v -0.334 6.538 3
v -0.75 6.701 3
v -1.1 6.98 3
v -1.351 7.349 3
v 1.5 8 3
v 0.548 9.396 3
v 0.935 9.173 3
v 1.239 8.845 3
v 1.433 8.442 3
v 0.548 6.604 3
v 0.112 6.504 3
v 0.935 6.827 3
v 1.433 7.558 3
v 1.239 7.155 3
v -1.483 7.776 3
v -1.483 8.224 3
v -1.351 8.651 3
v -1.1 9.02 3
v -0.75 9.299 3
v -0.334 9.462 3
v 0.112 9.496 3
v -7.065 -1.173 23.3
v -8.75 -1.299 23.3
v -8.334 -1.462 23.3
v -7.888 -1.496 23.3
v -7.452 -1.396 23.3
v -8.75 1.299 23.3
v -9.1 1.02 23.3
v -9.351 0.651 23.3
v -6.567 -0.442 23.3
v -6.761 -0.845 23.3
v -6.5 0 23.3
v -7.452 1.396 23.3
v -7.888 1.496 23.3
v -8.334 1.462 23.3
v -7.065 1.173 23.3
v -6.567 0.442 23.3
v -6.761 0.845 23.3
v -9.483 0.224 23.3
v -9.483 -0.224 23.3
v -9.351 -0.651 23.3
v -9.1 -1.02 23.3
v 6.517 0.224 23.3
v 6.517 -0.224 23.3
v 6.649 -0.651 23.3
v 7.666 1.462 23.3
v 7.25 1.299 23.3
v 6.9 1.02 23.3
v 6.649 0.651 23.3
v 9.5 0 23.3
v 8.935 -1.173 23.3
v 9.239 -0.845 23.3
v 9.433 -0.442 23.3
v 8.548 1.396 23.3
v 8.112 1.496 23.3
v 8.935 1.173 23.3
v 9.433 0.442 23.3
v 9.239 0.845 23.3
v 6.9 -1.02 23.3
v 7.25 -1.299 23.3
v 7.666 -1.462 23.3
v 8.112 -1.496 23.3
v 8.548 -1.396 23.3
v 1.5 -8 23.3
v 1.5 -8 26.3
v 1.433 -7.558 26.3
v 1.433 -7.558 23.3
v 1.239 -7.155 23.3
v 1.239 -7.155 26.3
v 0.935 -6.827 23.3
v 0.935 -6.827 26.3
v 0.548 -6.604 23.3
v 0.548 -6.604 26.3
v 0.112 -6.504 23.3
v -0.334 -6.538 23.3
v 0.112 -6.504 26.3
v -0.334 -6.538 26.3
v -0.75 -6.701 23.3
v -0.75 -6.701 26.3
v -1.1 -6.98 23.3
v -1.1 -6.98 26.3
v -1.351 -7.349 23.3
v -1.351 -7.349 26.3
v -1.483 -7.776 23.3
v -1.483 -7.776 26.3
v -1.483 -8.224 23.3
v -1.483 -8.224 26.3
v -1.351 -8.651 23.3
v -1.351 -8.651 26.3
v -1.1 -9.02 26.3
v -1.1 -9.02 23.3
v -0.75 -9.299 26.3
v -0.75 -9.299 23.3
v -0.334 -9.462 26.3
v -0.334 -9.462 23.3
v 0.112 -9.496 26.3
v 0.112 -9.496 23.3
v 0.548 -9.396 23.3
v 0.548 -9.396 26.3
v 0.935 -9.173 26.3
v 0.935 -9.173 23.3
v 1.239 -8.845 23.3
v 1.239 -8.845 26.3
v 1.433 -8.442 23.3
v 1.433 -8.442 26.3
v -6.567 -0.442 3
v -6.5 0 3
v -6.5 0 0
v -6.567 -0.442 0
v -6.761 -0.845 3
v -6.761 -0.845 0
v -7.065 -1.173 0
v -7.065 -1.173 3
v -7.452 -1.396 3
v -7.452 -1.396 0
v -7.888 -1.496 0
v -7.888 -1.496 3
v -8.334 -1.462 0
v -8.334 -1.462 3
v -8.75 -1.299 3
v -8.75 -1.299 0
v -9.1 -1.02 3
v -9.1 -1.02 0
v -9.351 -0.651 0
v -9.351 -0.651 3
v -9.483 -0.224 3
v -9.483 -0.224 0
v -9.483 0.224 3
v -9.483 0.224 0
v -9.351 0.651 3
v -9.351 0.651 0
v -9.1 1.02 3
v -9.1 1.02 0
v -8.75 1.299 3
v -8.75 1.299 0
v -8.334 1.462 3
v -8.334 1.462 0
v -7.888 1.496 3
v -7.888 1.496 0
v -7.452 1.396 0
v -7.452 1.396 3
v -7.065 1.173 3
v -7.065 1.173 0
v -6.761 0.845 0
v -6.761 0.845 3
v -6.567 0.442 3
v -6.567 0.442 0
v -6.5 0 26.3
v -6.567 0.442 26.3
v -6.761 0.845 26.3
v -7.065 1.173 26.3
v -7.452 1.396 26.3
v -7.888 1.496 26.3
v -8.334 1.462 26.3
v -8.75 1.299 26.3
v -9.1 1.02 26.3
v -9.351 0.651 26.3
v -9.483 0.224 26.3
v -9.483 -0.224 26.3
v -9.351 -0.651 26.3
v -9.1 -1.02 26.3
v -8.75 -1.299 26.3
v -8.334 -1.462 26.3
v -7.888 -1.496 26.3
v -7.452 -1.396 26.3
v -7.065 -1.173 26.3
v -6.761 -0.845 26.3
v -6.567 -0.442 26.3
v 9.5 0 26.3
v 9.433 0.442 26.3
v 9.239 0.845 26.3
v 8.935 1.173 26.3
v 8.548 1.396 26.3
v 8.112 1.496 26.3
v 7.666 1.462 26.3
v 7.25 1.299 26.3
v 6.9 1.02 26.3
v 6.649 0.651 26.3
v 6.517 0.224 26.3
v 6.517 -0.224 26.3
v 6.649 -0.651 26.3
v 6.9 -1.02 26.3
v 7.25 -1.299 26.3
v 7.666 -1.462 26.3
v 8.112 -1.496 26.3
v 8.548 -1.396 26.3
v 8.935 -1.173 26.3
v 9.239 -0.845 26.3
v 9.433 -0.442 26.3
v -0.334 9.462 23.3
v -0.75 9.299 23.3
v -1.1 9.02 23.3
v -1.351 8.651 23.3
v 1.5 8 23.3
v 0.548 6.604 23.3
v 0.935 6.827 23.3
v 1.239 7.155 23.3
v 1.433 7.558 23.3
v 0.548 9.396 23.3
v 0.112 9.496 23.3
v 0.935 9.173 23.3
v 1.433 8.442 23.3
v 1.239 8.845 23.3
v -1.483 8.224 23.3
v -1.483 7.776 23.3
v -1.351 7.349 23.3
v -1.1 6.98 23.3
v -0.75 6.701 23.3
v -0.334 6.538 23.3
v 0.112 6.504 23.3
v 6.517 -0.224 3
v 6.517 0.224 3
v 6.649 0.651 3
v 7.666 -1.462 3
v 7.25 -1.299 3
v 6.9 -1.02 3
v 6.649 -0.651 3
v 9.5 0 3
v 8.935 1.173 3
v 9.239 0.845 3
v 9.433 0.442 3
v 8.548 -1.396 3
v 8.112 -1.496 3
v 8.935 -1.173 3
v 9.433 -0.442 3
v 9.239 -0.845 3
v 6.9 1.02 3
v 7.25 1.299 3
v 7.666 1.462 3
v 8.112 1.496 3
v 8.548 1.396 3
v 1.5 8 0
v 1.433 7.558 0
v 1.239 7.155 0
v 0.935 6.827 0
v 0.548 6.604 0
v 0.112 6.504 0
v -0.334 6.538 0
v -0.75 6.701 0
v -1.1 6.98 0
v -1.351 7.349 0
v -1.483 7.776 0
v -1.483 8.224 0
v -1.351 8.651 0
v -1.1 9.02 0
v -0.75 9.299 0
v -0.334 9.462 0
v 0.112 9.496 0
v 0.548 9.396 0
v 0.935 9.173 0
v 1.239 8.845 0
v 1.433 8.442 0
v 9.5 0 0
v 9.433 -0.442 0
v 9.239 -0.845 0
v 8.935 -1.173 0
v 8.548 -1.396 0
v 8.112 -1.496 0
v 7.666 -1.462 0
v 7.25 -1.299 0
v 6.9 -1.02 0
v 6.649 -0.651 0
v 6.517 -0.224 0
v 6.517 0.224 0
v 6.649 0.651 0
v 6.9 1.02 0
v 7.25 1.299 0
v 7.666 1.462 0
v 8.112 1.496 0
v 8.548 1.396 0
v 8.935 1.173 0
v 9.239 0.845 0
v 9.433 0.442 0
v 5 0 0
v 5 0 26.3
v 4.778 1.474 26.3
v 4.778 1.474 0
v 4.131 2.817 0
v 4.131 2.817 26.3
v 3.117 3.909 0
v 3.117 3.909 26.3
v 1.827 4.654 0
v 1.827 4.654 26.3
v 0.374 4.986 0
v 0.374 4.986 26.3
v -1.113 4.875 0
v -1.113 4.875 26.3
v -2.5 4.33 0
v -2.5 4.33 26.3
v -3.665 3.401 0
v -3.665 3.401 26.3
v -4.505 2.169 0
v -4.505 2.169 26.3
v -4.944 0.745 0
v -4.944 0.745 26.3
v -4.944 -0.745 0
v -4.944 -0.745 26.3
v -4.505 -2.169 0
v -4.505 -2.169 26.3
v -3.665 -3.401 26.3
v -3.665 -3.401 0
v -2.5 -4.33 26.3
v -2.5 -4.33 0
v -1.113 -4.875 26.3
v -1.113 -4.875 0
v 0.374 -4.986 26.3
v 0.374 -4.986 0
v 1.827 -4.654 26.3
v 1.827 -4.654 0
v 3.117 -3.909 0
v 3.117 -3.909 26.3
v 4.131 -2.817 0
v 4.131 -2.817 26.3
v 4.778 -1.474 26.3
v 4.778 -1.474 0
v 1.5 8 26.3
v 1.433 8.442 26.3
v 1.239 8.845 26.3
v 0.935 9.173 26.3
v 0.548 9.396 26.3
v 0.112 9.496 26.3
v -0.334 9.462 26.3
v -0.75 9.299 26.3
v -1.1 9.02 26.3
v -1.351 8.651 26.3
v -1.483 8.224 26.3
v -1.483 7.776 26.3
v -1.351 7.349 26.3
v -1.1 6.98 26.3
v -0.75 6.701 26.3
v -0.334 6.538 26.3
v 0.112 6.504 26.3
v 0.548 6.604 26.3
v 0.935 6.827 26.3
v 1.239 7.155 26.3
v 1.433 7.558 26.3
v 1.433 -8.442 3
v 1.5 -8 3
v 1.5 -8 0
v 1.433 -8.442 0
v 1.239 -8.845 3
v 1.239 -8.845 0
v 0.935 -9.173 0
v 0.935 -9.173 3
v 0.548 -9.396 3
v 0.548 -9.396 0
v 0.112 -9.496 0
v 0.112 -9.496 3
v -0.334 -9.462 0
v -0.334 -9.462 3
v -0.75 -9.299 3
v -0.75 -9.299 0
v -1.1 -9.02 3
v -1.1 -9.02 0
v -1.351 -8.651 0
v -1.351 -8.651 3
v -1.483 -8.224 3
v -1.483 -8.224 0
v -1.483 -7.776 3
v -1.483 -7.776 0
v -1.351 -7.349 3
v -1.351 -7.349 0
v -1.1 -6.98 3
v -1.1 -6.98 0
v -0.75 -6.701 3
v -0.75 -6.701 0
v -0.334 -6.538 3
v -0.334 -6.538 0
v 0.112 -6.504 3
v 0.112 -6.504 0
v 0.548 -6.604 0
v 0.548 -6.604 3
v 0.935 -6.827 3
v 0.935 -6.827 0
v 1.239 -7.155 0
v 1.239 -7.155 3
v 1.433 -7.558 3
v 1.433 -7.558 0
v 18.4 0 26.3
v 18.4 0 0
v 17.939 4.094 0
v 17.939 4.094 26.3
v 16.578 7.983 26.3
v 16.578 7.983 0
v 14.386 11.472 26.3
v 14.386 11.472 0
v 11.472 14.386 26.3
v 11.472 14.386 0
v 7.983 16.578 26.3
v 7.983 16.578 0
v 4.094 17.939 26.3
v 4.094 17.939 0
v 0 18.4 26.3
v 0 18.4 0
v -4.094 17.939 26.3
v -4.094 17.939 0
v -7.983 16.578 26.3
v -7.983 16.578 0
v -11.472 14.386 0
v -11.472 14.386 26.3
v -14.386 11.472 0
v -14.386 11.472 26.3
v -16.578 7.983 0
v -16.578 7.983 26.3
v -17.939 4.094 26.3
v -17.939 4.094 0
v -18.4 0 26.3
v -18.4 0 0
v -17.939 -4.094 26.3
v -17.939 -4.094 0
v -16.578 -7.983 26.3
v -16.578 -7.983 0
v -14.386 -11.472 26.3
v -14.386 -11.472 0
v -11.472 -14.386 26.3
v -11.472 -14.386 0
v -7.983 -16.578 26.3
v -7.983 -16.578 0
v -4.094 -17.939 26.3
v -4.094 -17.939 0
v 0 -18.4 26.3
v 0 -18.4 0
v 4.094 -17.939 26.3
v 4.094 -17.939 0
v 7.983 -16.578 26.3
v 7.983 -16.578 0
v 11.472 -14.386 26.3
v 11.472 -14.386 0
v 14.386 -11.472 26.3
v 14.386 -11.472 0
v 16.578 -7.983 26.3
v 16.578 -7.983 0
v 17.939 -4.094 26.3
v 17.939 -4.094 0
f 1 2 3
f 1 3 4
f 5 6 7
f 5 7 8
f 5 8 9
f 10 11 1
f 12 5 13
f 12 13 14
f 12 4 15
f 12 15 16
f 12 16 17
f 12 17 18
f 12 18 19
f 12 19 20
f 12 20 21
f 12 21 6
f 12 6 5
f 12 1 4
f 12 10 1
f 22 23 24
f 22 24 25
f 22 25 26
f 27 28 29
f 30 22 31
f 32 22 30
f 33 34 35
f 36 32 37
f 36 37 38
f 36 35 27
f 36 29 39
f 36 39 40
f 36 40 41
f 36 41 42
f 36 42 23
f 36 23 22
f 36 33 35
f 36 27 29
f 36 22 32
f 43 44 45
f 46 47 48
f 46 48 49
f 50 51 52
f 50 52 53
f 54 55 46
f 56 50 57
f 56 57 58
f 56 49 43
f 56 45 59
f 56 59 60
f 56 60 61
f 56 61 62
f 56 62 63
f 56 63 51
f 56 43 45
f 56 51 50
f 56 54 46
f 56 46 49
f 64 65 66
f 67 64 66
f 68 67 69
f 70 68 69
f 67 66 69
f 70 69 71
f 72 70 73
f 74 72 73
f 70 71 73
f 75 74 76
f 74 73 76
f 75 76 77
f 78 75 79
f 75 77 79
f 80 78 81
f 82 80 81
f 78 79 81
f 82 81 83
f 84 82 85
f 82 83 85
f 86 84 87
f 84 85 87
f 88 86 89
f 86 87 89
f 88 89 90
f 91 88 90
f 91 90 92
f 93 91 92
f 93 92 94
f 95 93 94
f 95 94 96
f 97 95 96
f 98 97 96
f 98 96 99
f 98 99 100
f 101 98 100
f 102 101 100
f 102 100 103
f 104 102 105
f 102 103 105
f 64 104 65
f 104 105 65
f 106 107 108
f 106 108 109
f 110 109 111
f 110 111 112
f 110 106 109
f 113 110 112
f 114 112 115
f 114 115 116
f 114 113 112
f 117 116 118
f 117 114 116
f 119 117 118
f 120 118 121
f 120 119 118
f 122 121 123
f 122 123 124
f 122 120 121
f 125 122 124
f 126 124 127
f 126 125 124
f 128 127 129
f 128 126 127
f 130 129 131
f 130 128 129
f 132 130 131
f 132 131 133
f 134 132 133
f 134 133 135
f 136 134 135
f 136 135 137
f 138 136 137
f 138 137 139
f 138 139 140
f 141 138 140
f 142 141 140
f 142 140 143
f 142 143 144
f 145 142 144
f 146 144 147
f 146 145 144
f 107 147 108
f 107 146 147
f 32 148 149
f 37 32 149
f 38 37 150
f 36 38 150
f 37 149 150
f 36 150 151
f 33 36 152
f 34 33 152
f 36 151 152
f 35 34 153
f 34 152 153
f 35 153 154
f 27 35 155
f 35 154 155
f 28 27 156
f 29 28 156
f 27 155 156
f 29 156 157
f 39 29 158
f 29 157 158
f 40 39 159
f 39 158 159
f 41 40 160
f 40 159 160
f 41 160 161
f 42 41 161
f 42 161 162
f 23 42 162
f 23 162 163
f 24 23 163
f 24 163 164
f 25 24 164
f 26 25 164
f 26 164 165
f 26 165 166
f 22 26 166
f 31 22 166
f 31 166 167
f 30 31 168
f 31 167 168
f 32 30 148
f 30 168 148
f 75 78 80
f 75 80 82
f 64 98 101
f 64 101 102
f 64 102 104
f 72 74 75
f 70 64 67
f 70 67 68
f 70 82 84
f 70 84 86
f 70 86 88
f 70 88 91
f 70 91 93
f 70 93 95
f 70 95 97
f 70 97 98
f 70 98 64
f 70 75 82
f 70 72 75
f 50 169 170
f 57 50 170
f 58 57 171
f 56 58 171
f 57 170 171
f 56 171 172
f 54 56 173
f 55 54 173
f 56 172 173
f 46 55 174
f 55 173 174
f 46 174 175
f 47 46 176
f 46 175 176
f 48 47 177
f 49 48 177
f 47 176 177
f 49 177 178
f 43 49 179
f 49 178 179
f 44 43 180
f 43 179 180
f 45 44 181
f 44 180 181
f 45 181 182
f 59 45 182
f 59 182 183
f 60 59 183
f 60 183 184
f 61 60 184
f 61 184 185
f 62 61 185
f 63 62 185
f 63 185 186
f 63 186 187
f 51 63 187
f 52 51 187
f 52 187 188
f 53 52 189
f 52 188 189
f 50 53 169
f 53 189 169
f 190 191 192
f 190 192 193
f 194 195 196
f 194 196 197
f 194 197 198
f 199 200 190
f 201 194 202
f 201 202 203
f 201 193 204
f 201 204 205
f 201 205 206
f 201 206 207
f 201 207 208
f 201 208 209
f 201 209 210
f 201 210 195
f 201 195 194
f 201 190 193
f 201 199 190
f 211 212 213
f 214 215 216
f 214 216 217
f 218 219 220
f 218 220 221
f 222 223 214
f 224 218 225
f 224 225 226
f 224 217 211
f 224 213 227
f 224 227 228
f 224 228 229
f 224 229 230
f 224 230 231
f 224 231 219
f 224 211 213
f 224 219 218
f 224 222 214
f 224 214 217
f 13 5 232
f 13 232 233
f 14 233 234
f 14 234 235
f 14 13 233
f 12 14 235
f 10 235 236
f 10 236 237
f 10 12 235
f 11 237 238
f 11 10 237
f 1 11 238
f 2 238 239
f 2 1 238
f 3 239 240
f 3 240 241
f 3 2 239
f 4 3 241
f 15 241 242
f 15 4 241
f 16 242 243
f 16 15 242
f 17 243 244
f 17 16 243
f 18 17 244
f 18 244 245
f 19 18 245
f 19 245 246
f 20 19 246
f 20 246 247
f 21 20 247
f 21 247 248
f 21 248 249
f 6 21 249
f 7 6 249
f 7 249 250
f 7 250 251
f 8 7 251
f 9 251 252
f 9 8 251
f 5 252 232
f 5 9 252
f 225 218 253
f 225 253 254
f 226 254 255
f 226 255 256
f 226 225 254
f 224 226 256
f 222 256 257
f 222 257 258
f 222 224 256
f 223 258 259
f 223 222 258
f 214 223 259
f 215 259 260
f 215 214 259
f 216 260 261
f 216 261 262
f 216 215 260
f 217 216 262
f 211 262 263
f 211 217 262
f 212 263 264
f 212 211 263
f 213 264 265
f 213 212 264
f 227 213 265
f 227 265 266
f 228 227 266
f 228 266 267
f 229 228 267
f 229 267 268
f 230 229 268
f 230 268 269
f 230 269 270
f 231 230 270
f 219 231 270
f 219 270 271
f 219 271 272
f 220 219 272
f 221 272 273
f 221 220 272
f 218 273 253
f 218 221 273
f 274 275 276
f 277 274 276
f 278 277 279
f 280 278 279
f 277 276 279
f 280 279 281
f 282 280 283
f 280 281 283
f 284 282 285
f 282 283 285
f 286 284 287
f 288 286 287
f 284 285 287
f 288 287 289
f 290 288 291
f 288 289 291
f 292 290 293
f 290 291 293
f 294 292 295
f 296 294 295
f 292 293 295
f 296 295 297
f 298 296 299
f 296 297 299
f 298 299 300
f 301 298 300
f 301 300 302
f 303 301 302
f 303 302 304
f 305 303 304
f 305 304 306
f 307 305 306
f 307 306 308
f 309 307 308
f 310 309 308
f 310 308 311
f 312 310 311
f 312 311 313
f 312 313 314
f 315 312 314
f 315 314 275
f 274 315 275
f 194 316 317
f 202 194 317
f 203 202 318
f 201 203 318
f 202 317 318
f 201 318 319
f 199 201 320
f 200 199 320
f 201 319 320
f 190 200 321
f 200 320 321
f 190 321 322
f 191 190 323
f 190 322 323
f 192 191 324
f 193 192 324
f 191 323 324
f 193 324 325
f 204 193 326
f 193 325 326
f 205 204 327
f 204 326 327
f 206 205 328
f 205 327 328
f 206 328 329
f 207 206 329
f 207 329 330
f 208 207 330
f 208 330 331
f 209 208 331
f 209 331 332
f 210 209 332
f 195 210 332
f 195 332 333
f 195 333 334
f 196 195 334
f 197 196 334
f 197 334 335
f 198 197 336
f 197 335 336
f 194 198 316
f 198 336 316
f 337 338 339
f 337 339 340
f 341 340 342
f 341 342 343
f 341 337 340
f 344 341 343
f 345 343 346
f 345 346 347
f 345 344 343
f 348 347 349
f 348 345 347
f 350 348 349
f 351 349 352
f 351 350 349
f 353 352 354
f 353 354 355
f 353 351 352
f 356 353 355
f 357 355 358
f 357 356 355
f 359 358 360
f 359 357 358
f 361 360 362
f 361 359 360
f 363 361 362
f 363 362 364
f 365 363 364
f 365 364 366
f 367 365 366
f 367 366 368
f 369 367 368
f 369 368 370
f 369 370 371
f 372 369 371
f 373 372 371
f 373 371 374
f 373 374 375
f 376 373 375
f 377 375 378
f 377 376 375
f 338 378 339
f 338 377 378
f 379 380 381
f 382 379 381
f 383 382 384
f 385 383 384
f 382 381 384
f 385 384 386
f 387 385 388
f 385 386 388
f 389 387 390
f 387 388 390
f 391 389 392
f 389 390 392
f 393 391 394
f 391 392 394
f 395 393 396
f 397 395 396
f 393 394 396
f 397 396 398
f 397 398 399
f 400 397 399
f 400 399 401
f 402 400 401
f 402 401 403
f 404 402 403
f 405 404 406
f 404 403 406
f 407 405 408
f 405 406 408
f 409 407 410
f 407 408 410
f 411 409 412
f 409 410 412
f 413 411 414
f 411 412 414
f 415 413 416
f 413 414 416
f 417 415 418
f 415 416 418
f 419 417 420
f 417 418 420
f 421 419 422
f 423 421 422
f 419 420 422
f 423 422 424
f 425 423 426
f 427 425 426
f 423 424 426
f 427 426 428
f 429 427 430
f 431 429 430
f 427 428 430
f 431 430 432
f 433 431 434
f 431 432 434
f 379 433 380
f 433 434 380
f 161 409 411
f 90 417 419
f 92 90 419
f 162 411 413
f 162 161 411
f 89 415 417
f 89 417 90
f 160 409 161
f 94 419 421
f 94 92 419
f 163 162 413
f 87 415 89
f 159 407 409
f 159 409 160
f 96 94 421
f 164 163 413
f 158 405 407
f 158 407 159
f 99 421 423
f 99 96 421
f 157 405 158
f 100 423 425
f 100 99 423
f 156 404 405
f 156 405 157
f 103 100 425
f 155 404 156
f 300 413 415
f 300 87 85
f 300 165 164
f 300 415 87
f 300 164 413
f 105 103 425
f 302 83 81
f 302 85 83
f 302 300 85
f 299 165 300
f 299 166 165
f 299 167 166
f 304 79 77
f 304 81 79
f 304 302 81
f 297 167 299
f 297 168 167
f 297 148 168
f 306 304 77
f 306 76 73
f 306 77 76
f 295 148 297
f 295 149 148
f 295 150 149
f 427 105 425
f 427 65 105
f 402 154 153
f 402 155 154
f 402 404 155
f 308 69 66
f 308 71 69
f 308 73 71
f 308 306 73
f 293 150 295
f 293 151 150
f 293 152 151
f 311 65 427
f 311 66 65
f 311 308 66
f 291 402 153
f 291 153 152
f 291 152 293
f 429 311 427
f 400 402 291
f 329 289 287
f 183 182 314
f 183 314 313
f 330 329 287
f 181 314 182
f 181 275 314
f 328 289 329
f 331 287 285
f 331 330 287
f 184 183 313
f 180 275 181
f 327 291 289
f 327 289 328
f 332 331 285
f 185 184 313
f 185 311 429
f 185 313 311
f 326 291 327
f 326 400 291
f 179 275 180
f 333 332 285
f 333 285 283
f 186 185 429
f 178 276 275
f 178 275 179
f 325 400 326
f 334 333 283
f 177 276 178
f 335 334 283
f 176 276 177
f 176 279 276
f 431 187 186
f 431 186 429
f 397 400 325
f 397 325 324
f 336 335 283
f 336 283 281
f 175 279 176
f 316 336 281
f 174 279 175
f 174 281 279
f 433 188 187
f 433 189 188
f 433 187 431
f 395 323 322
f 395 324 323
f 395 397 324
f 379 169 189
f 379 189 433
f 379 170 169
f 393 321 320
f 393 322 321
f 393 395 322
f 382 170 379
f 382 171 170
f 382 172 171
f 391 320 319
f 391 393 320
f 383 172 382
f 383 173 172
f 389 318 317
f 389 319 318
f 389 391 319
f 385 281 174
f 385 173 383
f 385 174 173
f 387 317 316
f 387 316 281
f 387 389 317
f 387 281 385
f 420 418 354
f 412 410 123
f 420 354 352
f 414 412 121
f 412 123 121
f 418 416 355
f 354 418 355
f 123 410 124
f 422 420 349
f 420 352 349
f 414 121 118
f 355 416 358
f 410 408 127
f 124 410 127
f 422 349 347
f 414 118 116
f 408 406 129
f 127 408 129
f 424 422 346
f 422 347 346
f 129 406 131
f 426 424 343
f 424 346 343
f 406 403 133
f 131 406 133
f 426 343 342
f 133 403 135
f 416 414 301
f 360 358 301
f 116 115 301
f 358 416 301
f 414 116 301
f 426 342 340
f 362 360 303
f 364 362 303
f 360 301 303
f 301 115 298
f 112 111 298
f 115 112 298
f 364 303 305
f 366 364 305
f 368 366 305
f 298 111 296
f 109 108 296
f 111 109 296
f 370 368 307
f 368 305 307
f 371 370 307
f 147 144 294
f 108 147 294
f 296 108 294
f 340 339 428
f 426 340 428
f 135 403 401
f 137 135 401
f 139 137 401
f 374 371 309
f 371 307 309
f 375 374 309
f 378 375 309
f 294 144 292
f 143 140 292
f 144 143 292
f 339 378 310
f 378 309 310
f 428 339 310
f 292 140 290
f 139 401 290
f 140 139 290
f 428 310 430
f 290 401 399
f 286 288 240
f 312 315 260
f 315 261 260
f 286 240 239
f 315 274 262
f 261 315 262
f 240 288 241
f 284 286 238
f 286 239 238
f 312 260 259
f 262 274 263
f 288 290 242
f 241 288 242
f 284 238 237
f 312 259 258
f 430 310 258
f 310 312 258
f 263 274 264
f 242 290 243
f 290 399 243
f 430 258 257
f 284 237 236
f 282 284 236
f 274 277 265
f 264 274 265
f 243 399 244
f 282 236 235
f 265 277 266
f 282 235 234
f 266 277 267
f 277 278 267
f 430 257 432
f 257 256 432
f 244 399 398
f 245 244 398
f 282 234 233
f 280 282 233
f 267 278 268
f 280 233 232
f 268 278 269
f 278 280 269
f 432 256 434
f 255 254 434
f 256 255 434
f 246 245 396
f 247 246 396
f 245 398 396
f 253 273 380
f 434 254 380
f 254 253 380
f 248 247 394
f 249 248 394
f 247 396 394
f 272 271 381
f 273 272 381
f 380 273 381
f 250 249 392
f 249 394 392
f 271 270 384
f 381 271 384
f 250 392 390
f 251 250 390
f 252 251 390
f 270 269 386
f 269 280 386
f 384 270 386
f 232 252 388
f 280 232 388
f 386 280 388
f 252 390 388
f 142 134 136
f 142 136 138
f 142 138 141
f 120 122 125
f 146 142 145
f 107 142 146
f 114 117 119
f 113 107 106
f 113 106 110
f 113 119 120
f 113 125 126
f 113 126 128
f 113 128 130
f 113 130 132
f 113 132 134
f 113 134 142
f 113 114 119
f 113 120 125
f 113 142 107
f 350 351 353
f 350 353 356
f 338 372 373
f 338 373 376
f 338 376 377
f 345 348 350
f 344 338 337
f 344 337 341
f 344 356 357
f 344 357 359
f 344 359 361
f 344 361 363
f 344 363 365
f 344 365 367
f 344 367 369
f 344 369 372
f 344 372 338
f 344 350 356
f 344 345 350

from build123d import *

# Parameters (mm, degrees)
CROQUIS1_R              = 18.4
SALIENTE_EXTRUIR1_DEPTH = 26.3
CROQUIS2_R              = 1.5
CORTAR_EXTRUIR1_DEPTH   = 3
CROQUIS3_R              = 5
CORTAR_EXTRUIR2_DEPTH   = 44
CORTAR_EXTRUIR3_START   = -3
CROQUIS4_R              = 1.5
CORTAR_EXTRUIR3_DEPTH   = 3


with BuildPart() as part:
    # Croquis1 → Saliente-Extruir1 (new body)
    with BuildSketch(Plane.XY):
        Circle(CROQUIS1_R)
    extrude(amount=SALIENTE_EXTRUIR1_DEPTH)

    # Croquis2 → Cortar-Extruir1 (cut)
    with BuildSketch(Plane.XY.offset(26.3)):
        with Locations((0, 8)):
            Circle(CROQUIS2_R)
        with Locations((8, 0)):
            Circle(CROQUIS2_R)
        with Locations((0, -8)):
            Circle(CROQUIS2_R)
        with Locations((-8, 0)):
            Circle(CROQUIS2_R)
    extrude(amount=-CORTAR_EXTRUIR1_DEPTH, mode=Mode.SUBTRACT)

    # Croquis3 → Cortar-Extruir2 (cut)
    with BuildSketch(Plane.XY.offset(26.3)):
        Circle(CROQUIS3_R)
    extrude(amount=-CORTAR_EXTRUIR2_DEPTH, mode=Mode.SUBTRACT)

    # Croquis4 → Cortar-Extruir3 (cut)
    with BuildSketch(Plane(origin=(0, 0, 0), x_dir=(-1, 0, 0), z_dir=(0, 0, -1)).offset(CORTAR_EXTRUIR3_START)):
        with Locations(Location((0, 8, 0), (0, 0, 180))):
            Circle(CROQUIS4_R)
        with Locations(Location((8, 0, 0), (0, 0, 180))):
            Circle(CROQUIS4_R)
        with Locations(Location((0, -8, 0), (0, 0, 180))):
            Circle(CROQUIS4_R)
        with Locations(Location((-8, 0, 0), (0, 0, 180))):
            Circle(CROQUIS4_R)
    extrude(amount=CORTAR_EXTRUIR3_DEPTH, mode=Mode.SUBTRACT)


solid = part.part
